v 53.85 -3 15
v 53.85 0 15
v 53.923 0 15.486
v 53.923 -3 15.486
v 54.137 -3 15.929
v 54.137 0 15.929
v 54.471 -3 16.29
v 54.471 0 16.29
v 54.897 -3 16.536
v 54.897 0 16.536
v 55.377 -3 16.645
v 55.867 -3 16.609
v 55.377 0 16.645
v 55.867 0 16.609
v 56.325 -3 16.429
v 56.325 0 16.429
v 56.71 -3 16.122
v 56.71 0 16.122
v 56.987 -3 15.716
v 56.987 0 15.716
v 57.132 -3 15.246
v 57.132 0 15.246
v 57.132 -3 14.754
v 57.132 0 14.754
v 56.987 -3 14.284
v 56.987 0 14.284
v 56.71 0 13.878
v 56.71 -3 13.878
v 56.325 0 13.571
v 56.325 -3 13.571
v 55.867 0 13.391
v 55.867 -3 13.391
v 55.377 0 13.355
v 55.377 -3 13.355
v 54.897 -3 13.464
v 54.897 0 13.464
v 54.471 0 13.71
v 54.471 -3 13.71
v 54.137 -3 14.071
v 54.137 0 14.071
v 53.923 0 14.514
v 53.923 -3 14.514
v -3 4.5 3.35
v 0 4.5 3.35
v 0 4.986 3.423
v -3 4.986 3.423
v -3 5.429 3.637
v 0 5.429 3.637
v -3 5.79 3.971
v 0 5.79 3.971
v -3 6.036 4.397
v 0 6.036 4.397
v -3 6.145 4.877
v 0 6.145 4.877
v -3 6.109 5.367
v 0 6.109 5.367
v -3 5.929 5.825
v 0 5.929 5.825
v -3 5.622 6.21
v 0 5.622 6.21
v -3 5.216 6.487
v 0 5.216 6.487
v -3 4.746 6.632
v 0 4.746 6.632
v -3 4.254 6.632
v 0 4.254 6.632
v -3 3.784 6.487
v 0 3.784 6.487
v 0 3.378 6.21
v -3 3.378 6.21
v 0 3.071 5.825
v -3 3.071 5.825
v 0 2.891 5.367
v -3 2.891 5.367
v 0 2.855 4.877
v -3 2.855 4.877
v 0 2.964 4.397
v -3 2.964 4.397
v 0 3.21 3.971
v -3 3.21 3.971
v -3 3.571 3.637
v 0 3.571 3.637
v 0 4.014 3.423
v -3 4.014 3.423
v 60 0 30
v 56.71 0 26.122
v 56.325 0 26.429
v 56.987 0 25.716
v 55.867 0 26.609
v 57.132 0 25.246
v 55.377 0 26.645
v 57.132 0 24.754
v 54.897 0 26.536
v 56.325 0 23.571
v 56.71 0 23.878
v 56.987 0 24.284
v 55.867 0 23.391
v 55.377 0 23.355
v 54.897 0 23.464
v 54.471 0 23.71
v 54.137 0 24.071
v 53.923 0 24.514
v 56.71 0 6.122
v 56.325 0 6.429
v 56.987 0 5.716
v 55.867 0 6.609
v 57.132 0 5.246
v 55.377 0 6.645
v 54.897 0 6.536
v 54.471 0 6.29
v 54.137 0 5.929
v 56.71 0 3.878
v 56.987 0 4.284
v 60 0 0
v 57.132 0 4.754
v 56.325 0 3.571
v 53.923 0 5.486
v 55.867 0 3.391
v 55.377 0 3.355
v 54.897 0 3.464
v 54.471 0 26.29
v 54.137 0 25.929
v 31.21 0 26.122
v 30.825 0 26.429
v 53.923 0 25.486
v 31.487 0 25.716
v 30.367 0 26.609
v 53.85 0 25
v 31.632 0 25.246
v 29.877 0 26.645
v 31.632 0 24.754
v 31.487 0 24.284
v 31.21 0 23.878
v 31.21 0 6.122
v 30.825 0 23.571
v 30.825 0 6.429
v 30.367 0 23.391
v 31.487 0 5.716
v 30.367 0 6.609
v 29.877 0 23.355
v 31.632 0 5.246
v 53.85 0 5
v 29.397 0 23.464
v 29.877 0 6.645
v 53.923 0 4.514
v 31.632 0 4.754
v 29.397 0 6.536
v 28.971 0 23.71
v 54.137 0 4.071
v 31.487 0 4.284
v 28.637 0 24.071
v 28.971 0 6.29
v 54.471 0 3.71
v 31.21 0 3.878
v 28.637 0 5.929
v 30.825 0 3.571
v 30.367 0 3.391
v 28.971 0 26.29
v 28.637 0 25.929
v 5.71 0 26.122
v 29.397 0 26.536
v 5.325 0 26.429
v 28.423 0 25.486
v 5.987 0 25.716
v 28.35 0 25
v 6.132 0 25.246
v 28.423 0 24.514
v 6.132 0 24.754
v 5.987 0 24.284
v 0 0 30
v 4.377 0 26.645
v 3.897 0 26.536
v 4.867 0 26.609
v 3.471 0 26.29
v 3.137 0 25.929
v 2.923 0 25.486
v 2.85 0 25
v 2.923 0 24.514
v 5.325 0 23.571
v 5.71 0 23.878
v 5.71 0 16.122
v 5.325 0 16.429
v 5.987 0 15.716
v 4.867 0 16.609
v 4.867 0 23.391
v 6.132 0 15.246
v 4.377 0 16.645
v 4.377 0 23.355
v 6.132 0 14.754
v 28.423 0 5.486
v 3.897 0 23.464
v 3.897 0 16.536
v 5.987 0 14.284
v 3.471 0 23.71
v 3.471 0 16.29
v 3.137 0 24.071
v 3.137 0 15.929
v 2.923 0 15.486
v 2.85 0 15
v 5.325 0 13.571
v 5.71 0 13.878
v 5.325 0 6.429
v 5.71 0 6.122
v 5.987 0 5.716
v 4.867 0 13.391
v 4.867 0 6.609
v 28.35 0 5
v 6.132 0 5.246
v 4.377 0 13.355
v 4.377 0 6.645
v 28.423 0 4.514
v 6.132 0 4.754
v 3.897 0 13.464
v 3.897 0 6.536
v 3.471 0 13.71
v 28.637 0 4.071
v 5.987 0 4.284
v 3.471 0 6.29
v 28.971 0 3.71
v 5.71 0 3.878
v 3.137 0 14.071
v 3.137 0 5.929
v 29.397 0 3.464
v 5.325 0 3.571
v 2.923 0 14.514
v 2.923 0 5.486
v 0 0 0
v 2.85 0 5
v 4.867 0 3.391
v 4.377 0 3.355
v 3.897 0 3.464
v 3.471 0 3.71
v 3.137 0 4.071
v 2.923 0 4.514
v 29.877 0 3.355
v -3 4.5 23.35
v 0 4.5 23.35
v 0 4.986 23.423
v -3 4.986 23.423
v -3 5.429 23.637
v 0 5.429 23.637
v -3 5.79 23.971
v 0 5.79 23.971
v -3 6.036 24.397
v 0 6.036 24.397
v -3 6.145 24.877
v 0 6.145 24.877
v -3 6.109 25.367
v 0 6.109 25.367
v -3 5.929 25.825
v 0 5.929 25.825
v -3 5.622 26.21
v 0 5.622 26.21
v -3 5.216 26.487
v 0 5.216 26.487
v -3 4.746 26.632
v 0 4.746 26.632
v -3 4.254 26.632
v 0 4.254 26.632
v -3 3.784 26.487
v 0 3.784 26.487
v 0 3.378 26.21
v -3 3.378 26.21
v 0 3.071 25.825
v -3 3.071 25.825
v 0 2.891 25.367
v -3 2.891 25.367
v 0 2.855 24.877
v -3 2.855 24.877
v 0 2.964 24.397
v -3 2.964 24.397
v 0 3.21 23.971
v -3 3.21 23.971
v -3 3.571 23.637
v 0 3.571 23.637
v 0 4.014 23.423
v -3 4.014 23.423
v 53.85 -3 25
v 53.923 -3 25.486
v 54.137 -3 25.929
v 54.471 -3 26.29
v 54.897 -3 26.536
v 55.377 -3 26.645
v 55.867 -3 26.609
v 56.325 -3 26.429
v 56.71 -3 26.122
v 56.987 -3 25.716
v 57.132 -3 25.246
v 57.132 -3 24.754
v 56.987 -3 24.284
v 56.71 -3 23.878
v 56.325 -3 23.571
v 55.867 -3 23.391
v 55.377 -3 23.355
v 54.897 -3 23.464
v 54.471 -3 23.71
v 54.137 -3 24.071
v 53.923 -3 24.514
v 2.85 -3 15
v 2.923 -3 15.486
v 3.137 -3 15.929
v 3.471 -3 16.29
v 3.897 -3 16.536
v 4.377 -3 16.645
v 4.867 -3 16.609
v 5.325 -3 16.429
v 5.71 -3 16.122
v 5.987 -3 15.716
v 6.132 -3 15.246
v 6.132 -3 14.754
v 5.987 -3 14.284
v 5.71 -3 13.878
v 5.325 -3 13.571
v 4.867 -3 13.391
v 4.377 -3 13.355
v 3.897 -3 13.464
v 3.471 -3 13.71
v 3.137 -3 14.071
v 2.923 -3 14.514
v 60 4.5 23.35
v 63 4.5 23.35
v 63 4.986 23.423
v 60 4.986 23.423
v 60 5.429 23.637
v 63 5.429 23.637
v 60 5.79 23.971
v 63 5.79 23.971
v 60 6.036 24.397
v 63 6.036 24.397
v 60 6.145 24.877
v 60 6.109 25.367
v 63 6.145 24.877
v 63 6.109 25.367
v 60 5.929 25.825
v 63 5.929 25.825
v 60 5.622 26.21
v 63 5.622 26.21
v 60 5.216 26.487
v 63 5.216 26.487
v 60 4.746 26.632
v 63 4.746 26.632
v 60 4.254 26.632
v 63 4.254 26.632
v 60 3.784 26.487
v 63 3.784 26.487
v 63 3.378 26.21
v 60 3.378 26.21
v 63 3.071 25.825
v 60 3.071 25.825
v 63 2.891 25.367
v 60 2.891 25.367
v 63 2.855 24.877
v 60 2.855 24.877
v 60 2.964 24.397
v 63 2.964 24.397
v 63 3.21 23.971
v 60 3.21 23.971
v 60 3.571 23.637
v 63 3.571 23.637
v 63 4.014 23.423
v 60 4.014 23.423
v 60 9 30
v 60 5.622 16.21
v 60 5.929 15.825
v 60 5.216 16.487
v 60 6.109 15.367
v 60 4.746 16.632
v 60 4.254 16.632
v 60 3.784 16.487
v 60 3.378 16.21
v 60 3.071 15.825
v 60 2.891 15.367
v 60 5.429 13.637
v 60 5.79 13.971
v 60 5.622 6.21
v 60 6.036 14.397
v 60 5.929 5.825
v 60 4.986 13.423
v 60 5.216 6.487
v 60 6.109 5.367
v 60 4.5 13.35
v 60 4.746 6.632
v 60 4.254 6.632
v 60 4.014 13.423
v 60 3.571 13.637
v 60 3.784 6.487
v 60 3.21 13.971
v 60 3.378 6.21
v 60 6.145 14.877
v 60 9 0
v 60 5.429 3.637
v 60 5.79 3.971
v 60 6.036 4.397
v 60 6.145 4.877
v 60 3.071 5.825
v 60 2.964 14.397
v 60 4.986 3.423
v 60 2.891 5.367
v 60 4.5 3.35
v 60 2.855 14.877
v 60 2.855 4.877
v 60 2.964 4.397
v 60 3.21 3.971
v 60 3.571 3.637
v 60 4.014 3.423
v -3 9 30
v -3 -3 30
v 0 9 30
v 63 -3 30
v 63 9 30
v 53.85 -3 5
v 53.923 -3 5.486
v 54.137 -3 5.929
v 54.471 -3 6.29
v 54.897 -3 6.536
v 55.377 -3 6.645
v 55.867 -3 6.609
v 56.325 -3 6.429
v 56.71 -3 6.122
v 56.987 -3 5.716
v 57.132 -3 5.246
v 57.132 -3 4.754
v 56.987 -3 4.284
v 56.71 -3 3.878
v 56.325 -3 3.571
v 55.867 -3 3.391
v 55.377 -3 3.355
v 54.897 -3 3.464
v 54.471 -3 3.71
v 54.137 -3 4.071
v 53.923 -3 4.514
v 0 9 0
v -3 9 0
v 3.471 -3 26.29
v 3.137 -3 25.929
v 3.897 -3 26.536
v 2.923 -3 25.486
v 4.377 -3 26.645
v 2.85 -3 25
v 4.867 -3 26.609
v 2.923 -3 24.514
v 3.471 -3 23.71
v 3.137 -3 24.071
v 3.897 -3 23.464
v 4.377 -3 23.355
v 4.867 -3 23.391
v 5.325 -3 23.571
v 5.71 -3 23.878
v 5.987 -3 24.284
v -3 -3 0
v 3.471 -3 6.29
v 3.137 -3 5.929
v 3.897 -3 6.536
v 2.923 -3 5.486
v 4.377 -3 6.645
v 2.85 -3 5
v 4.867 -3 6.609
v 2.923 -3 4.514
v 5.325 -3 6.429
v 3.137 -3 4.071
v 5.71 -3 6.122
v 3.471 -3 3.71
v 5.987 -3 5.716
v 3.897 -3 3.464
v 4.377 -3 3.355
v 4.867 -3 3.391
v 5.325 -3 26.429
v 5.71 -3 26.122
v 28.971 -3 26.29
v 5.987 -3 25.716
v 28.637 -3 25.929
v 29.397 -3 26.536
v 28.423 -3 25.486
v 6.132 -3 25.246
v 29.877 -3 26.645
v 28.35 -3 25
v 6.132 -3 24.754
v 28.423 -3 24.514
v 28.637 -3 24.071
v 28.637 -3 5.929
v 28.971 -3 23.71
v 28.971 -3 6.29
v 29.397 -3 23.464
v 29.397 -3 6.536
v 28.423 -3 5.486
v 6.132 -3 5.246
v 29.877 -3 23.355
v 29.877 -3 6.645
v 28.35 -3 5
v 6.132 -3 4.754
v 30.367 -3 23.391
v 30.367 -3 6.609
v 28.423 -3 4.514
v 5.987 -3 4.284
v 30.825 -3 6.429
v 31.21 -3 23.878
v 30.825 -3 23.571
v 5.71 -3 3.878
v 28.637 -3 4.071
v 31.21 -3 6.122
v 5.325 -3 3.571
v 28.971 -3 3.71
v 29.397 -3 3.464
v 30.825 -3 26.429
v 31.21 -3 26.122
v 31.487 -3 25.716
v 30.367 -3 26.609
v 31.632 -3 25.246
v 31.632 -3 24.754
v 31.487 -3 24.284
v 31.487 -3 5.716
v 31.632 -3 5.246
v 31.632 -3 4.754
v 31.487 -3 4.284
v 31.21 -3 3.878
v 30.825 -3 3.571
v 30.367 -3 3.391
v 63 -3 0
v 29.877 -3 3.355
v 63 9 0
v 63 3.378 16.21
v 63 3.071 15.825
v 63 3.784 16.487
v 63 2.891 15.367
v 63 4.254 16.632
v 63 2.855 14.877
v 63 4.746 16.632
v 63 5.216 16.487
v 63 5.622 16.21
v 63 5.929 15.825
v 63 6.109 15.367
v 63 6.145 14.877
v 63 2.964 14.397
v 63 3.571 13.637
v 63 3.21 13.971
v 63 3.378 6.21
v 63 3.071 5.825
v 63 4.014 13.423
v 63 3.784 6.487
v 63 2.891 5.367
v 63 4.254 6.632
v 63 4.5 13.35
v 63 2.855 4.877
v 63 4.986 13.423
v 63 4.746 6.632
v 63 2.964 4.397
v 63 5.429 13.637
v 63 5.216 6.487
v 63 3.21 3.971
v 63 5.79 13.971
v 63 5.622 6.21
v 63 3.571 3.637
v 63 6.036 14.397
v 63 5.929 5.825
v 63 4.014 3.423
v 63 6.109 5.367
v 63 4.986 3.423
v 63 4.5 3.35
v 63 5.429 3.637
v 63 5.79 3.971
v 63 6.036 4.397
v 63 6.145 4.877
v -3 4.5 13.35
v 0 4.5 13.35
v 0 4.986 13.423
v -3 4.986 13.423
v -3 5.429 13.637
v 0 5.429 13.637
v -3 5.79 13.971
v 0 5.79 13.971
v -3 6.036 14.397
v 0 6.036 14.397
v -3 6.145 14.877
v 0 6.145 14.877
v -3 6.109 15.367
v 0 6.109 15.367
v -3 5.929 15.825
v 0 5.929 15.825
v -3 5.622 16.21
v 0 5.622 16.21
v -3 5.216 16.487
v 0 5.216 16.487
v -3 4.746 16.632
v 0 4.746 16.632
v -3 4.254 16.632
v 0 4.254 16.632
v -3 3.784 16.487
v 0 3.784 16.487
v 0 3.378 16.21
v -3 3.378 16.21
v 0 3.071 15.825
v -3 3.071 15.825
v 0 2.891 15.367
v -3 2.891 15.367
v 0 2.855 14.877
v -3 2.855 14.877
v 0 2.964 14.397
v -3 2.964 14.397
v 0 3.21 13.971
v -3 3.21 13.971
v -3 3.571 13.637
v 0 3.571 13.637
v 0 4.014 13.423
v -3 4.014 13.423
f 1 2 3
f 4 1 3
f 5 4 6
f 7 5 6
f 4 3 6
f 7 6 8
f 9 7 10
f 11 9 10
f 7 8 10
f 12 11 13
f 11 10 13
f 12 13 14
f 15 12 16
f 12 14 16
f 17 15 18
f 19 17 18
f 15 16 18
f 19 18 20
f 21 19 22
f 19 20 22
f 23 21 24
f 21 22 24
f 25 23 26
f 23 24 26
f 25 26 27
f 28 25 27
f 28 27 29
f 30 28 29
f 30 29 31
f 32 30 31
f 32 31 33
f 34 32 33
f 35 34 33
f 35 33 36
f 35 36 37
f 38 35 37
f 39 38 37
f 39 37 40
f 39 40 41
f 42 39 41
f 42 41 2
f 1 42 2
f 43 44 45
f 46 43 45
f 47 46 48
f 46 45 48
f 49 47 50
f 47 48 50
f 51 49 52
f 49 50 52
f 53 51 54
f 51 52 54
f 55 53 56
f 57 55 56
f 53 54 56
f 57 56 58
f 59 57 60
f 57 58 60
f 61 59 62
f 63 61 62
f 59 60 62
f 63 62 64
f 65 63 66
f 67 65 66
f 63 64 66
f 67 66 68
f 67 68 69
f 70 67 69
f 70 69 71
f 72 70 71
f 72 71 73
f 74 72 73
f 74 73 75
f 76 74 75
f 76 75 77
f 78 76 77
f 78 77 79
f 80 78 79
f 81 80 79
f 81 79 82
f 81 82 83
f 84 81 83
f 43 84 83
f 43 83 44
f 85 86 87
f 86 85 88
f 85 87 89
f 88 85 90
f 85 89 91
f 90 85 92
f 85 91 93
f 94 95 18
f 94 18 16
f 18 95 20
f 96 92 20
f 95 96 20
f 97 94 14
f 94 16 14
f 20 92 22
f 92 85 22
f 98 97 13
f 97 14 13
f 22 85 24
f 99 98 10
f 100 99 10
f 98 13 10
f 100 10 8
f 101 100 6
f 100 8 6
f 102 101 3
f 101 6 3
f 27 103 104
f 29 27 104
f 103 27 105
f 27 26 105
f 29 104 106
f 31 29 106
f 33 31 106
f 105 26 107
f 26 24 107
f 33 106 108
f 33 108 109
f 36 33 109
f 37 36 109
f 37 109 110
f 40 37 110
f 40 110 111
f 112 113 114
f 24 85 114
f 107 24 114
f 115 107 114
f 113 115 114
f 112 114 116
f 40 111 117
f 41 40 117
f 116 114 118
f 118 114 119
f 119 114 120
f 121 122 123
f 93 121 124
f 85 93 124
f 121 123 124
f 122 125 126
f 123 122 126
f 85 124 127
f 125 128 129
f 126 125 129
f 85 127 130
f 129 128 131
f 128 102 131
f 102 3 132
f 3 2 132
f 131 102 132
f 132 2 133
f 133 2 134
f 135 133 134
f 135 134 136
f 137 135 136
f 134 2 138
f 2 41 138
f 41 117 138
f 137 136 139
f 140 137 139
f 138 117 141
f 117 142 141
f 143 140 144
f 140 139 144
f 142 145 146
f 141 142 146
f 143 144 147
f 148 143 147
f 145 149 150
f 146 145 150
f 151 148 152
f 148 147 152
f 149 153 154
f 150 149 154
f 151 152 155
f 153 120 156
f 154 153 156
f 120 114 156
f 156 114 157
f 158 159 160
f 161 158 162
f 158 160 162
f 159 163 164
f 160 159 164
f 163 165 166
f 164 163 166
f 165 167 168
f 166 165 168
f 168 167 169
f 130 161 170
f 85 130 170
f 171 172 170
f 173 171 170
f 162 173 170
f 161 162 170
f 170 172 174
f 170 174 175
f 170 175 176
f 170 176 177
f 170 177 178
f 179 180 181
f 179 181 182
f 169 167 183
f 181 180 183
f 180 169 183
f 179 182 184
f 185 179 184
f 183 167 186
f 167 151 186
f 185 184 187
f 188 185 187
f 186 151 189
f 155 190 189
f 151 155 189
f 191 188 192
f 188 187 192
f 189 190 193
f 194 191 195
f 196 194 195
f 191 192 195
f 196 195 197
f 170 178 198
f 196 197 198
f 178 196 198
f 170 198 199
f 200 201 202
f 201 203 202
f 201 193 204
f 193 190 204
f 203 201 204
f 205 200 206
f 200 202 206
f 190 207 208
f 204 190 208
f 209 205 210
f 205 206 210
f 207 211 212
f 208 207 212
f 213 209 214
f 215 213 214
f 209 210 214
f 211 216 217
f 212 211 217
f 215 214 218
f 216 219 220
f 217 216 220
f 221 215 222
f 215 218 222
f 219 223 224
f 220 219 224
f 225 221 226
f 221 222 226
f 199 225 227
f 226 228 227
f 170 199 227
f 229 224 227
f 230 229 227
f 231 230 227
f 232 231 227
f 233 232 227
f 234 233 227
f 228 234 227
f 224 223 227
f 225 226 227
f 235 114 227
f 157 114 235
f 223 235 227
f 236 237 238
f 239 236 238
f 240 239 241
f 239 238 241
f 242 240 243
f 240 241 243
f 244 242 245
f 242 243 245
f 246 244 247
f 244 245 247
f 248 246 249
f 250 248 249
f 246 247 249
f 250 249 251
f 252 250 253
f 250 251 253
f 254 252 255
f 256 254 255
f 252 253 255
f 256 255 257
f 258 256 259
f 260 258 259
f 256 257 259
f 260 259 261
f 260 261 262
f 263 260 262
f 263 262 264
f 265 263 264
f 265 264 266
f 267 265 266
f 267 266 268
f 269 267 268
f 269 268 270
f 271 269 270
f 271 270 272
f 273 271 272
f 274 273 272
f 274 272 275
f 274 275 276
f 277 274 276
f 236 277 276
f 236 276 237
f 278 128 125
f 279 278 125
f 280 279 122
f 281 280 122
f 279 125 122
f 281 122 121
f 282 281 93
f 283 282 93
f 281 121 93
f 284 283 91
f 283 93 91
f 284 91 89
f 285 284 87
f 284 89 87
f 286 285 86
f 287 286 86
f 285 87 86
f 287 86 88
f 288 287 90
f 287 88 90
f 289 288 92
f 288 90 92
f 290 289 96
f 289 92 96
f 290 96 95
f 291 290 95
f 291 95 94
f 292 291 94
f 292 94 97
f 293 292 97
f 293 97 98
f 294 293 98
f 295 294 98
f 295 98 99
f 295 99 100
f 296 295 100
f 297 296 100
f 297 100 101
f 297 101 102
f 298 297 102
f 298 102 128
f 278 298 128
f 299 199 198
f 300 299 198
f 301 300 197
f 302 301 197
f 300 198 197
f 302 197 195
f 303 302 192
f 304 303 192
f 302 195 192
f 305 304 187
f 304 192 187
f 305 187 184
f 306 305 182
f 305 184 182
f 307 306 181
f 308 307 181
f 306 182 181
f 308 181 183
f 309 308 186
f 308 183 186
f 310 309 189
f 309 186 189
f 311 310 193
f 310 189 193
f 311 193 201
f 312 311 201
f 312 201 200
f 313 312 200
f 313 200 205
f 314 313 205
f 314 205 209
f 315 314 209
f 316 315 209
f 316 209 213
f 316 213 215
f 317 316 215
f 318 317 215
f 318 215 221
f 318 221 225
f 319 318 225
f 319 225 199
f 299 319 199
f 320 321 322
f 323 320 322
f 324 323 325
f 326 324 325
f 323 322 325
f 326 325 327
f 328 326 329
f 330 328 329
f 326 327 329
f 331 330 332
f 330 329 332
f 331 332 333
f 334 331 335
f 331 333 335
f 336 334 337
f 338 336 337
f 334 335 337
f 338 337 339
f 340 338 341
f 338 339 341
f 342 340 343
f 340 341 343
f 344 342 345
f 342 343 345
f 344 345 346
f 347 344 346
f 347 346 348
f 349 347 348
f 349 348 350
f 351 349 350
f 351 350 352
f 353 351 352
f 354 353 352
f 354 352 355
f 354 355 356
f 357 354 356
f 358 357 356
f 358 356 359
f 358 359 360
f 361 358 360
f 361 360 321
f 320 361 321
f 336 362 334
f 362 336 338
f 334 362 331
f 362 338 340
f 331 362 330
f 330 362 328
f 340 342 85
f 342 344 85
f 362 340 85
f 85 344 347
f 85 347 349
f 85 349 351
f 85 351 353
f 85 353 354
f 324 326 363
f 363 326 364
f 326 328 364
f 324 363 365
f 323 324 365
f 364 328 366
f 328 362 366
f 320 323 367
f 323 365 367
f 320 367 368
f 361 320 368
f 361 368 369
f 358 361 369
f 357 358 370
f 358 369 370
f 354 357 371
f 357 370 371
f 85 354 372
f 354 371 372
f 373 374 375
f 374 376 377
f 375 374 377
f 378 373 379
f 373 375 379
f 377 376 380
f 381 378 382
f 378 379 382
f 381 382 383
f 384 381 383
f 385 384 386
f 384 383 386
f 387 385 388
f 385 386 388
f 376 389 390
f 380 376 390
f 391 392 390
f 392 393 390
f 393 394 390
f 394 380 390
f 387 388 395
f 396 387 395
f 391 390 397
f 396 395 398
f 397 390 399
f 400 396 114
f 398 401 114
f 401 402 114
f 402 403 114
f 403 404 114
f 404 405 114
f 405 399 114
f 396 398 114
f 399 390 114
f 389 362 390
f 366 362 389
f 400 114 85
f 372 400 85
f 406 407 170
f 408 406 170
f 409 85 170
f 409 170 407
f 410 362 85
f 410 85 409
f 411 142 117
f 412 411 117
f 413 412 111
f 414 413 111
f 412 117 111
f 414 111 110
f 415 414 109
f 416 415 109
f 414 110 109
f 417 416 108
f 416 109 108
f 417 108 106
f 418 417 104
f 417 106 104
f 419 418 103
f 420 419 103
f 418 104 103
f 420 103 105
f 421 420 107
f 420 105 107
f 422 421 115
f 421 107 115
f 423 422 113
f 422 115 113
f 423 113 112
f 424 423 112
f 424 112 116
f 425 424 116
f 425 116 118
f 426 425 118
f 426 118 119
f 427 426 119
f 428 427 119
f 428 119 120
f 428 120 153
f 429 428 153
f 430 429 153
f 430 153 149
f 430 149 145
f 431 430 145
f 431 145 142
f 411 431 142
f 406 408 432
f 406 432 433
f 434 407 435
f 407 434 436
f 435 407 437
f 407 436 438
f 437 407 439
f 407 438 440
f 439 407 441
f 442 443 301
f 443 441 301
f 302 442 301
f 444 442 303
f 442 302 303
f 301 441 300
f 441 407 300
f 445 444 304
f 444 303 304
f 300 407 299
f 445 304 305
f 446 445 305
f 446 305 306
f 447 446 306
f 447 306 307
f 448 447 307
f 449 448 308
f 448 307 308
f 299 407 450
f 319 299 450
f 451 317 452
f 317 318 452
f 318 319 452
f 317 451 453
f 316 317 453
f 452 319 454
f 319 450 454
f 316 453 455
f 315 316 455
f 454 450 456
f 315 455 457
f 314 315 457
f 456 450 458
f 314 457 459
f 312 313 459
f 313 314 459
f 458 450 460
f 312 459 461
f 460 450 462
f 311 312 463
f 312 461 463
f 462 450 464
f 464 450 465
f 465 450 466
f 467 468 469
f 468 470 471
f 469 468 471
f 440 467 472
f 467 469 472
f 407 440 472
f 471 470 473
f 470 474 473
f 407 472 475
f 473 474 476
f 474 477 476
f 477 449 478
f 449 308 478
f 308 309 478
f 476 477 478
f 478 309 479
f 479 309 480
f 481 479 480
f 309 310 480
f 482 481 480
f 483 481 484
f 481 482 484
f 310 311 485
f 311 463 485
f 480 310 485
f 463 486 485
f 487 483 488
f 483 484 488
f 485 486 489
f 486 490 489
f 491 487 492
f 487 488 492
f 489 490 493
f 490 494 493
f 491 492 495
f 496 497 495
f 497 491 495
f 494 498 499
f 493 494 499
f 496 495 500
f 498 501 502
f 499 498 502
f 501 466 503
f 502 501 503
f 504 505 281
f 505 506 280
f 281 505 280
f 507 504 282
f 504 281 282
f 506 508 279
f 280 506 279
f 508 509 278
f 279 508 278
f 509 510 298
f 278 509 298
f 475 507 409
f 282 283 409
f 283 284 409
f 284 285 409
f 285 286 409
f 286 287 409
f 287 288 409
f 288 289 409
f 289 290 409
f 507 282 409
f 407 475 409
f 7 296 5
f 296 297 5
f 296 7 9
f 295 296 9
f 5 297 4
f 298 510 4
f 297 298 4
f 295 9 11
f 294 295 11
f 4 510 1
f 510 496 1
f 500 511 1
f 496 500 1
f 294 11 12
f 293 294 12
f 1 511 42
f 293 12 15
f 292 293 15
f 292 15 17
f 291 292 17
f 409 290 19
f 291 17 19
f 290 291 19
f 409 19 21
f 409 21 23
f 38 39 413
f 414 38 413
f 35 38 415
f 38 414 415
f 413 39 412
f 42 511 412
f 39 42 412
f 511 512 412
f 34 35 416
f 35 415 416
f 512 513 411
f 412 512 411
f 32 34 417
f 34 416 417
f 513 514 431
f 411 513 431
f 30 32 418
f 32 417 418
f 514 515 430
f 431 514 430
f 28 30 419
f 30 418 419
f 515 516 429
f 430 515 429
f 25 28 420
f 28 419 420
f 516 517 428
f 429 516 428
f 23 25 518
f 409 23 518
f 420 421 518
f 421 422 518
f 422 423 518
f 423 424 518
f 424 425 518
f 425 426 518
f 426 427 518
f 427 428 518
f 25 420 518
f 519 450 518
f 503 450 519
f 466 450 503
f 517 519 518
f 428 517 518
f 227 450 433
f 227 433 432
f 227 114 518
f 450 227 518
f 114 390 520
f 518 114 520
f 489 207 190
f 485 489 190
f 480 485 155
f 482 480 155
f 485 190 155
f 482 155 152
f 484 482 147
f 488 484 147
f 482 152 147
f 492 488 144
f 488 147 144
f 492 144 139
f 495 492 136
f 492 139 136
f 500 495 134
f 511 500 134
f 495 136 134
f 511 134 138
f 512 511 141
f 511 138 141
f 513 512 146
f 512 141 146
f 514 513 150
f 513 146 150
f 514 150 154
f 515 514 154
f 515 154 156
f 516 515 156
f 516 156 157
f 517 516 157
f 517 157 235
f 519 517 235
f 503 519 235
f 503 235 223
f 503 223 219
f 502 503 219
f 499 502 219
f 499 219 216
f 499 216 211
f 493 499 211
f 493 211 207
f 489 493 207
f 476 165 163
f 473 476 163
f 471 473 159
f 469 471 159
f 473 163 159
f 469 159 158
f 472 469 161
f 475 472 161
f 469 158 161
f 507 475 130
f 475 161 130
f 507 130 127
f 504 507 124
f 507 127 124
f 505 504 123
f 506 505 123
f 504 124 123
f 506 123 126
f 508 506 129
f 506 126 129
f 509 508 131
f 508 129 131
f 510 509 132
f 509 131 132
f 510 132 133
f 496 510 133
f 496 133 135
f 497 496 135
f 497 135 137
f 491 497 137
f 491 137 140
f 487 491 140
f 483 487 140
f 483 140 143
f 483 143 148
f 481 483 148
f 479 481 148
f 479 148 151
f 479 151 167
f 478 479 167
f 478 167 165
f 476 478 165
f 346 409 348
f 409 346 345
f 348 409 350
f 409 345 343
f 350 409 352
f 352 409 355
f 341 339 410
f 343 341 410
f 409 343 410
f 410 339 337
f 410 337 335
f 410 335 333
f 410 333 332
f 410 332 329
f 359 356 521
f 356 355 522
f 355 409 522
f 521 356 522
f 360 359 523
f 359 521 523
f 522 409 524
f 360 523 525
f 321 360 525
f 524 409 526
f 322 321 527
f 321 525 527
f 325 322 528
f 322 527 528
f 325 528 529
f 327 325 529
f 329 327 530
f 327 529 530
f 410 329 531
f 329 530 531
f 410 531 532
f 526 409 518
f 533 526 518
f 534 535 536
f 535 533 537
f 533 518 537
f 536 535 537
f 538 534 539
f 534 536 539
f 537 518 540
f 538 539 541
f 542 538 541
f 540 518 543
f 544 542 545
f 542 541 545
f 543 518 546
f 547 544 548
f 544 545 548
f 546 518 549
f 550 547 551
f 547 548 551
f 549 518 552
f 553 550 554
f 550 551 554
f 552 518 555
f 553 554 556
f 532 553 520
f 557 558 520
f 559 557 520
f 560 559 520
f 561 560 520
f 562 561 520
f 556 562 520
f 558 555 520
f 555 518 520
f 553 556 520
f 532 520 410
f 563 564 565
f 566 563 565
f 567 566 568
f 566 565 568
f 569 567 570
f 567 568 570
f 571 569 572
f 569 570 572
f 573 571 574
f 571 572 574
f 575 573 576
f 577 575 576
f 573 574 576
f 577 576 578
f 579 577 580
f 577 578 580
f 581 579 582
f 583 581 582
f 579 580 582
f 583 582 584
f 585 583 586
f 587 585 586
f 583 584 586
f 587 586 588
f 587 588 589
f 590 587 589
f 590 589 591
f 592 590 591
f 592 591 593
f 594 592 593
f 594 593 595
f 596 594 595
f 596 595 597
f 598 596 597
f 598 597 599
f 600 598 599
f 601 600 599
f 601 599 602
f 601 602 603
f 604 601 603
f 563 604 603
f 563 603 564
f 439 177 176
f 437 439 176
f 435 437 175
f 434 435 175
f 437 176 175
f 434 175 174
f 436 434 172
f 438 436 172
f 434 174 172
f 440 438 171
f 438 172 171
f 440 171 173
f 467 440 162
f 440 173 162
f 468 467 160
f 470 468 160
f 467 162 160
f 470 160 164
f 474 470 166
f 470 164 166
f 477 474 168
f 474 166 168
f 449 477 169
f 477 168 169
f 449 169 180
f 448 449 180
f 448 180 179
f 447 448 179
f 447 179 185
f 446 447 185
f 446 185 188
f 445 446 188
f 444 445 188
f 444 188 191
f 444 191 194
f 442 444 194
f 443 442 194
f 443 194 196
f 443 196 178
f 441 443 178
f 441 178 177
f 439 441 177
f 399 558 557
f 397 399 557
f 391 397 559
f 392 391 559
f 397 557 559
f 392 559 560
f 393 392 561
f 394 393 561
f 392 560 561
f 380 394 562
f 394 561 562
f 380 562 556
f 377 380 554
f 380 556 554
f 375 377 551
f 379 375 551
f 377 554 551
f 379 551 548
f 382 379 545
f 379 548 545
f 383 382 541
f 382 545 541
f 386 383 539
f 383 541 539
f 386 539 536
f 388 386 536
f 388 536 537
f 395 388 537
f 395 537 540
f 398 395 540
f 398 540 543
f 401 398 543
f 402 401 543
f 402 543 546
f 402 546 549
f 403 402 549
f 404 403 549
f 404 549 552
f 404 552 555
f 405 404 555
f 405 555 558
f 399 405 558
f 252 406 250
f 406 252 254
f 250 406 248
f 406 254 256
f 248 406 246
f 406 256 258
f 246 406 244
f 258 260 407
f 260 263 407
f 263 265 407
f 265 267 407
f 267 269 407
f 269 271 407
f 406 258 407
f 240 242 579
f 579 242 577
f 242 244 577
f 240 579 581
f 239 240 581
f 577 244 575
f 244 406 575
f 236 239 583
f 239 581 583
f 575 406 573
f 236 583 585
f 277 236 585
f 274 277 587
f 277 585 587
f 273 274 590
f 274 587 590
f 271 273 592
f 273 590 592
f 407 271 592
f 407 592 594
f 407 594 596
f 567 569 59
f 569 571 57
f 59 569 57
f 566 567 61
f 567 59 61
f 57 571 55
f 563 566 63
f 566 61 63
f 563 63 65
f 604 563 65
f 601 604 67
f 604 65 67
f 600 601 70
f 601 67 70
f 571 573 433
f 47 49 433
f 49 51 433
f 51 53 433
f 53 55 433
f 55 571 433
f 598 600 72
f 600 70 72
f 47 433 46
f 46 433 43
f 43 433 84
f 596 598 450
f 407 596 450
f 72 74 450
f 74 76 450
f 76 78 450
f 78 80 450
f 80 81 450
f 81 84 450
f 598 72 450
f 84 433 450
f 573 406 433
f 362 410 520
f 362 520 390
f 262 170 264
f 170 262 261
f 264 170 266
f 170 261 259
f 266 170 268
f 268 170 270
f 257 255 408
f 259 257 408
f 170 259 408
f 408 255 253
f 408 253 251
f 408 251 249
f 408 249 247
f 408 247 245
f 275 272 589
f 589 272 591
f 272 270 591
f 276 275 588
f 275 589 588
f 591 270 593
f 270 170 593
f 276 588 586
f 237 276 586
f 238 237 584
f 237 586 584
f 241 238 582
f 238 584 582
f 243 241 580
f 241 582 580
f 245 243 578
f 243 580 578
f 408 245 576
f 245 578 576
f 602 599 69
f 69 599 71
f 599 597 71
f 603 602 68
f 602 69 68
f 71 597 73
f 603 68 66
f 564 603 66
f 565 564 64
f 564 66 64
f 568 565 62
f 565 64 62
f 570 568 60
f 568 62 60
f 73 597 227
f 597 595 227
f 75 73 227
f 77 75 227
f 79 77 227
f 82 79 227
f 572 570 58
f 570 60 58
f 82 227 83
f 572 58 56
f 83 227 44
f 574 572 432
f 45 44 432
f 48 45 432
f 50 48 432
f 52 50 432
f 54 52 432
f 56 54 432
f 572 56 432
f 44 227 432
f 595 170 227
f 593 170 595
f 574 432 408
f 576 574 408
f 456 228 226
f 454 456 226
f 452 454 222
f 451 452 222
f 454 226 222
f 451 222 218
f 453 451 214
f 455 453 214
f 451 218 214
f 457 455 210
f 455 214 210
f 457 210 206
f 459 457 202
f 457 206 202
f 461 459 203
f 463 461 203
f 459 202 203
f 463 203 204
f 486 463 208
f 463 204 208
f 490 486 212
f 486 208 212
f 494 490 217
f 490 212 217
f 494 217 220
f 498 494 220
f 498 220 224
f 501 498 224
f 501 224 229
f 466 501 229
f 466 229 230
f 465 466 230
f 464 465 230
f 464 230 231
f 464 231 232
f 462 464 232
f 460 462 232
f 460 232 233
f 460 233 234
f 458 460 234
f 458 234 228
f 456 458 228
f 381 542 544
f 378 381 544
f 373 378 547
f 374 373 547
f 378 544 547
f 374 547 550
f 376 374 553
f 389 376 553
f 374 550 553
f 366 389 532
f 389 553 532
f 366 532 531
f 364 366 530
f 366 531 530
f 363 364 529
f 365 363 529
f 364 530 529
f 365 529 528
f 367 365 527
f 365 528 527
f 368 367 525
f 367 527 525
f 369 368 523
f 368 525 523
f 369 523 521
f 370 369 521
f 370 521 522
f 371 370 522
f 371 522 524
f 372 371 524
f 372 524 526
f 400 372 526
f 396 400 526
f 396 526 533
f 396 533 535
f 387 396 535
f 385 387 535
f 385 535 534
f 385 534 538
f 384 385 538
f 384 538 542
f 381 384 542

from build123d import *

# Parameters (mm, degrees)
EXTRUDE_1_DEPTH     = 30
SKETCH_2_R          = 1.65
CUT_EXTRUDE_1_DEPTH = 74.054773971
CUT_EXTRUDE_2_REACH = 72.356
SKETCH_3_R          = 1.65
CUT_EXTRUDE_3_REACH = 72.356
SKETCH_4_R          = 1.65


with BuildPart() as part:
    # ｽｹｯﾁ1 → ﾎﾞｽ - 押し出し1 (new body)
    with BuildSketch(Plane.XY):
        Polygon((0, 0), (0, 9), (-3, 9), (-3, -3), (63, -3), (63, 9), (60, 9), (60, 0), align=None)
    extrude(amount=EXTRUDE_1_DEPTH)

    # ｽｹｯﾁ2 → ｶｯﾄ - 押し出し1 (cut, through all)
    with BuildSketch(Plane(origin=(63, 0, 0), x_dir=(0, 0, -1), z_dir=(1, 0, 0))):
        with Locations((-25, 4.5)):
            Circle(SKETCH_2_R)
        with Locations((-5, 4.5)):
            Circle(SKETCH_2_R)
        with Locations((-15, 4.5)):
            Circle(SKETCH_2_R)
    extrude(amount=-CUT_EXTRUDE_1_DEPTH, mode=Mode.SUBTRACT)

    # ｽｹｯﾁ3 → ｶｯﾄ - 押し出し2 (cut, up to next)
    with BuildSketch(Plane(origin=(0, 0, 0), x_dir=(1, 0, 0), z_dir=(0, 1, 0)), mode=Mode.PRIVATE) as cut_extrude_2_sk1:
        with Locations(Location((30, -5, 0), (0, 0, 180))):
            Circle(SKETCH_3_R)
    cut_extrude_2_tool1 = extrude(cut_extrude_2_sk1.sketch, amount=-CUT_EXTRUDE_2_REACH, mode=Mode.PRIVATE) & part.part
    # ｽｹｯﾁ3 → ｶｯﾄ - 押し出し2 (cut, up to next)
    with BuildSketch(Plane(origin=(0, 0, 0), x_dir=(1, 0, 0), z_dir=(0, 1, 0)), mode=Mode.PRIVATE) as cut_extrude_2_sk2:
        with Locations(Location((30, -25, 0), (0, 0, 180))):
            Circle(SKETCH_3_R)
    cut_extrude_2_tool2 = extrude(cut_extrude_2_sk2.sketch, amount=-CUT_EXTRUDE_2_REACH, mode=Mode.PRIVATE) & part.part
    add(cut_extrude_2_tool1.solids().sort_by_distance((30, 0, 5))[0], mode=Mode.SUBTRACT)
    add(cut_extrude_2_tool2.solids().sort_by_distance((30, 0, 25))[0], mode=Mode.SUBTRACT)

    # ｽｹｯﾁ4 → ｶｯﾄ - 押し出し3 (cut, up to next)
    with BuildSketch(Plane(origin=(0, 0, 0), x_dir=(1, 0, 0), z_dir=(0, 1, 0)), mode=Mode.PRIVATE) as cut_extrude_3_sk1:
        with Locations(Location((4.5, -5, 0), (0, 0, 180))):
            Circle(SKETCH_4_R)
    cut_extrude_3_tool1 = extrude(cut_extrude_3_sk1.sketch, amount=-CUT_EXTRUDE_3_REACH, mode=Mode.PRIVATE) & part.part
    # ｽｹｯﾁ4 → ｶｯﾄ - 押し出し3 (cut, up to next)
    with BuildSketch(Plane(origin=(0, 0, 0), x_dir=(1, 0, 0), z_dir=(0, 1, 0)), mode=Mode.PRIVATE) as cut_extrude_3_sk2:
        with Locations(Location((4.5, -15, 0), (0, 0, 180))):
            Circle(SKETCH_4_R)
    cut_extrude_3_tool2 = extrude(cut_extrude_3_sk2.sketch, amount=-CUT_EXTRUDE_3_REACH, mode=Mode.PRIVATE) & part.part
    # ｽｹｯﾁ4 → ｶｯﾄ - 押し出し3 (cut, up to next)
    with BuildSketch(Plane(origin=(0, 0, 0), x_dir=(1, 0, 0), z_dir=(0, 1, 0)), mode=Mode.PRIVATE) as cut_extrude_3_sk3:
        with Locations(Location((4.5, -25, 0), (0, 0, 180))):
            Circle(SKETCH_4_R)
    cut_extrude_3_tool3 = extrude(cut_extrude_3_sk3.sketch, amount=-CUT_EXTRUDE_3_REACH, mode=Mode.PRIVATE) & part.part
    # ｽｹｯﾁ4 → ｶｯﾄ - 押し出し3 (cut, up to next)
    with BuildSketch(Plane(origin=(0, 0, 0), x_dir=(1, 0, 0), z_dir=(0, 1, 0)), mode=Mode.PRIVATE) as cut_extrude_3_sk4:
        with Locations(Location((55.5, -25, 0), (0, 0, 180))):
            Circle(SKETCH_4_R)
    cut_extrude_3_tool4 = extrude(cut_extrude_3_sk4.sketch, amount=-CUT_EXTRUDE_3_REACH, mode=Mode.PRIVATE) & part.part
    # ｽｹｯﾁ4 → ｶｯﾄ - 押し出し3 (cut, up to next)
    with BuildSketch(Plane(origin=(0, 0, 0), x_dir=(1, 0, 0), z_dir=(0, 1, 0)), mode=Mode.PRIVATE) as cut_extrude_3_sk5:
        with Locations(Location((55.5, -15, 0), (0, 0, 180))):
            Circle(SKETCH_4_R)
    cut_extrude_3_tool5 = extrude(cut_extrude_3_sk5.sketch, amount=-CUT_EXTRUDE_3_REACH, mode=Mode.PRIVATE) & part.part
    # ｽｹｯﾁ4 → ｶｯﾄ - 押し出し3 (cut, up to next)
    with BuildSketch(Plane(origin=(0, 0, 0), x_dir=(1, 0, 0), z_dir=(0, 1, 0)), mode=Mode.PRIVATE) as cut_extrude_3_sk6:
        with Locations(Location((55.5, -5, 0), (0, 0, 180))):
            Circle(SKETCH_4_R)
    cut_extrude_3_tool6 = extrude(cut_extrude_3_sk6.sketch, amount=-CUT_EXTRUDE_3_REACH, mode=Mode.PRIVATE) & part.part
    add(cut_extrude_3_tool1.solids().sort_by_distance((4.5, 0, 5))[0], mode=Mode.SUBTRACT)
    add(cut_extrude_3_tool2.solids().sort_by_distance((4.5, 0, 15))[0], mode=Mode.SUBTRACT)
    add(cut_extrude_3_tool3.solids().sort_by_distance((4.5, 0, 25))[0], mode=Mode.SUBTRACT)
    add(cut_extrude_3_tool4.solids().sort_by_distance((55.5, 0, 25))[0], mode=Mode.SUBTRACT)
    add(cut_extrude_3_tool5.solids().sort_by_distance((55.5, 0, 15))[0], mode=Mode.SUBTRACT)
    add(cut_extrude_3_tool6.solids().sort_by_distance((55.5, 0, 5))[0], mode=Mode.SUBTRACT)


solid = part.part
